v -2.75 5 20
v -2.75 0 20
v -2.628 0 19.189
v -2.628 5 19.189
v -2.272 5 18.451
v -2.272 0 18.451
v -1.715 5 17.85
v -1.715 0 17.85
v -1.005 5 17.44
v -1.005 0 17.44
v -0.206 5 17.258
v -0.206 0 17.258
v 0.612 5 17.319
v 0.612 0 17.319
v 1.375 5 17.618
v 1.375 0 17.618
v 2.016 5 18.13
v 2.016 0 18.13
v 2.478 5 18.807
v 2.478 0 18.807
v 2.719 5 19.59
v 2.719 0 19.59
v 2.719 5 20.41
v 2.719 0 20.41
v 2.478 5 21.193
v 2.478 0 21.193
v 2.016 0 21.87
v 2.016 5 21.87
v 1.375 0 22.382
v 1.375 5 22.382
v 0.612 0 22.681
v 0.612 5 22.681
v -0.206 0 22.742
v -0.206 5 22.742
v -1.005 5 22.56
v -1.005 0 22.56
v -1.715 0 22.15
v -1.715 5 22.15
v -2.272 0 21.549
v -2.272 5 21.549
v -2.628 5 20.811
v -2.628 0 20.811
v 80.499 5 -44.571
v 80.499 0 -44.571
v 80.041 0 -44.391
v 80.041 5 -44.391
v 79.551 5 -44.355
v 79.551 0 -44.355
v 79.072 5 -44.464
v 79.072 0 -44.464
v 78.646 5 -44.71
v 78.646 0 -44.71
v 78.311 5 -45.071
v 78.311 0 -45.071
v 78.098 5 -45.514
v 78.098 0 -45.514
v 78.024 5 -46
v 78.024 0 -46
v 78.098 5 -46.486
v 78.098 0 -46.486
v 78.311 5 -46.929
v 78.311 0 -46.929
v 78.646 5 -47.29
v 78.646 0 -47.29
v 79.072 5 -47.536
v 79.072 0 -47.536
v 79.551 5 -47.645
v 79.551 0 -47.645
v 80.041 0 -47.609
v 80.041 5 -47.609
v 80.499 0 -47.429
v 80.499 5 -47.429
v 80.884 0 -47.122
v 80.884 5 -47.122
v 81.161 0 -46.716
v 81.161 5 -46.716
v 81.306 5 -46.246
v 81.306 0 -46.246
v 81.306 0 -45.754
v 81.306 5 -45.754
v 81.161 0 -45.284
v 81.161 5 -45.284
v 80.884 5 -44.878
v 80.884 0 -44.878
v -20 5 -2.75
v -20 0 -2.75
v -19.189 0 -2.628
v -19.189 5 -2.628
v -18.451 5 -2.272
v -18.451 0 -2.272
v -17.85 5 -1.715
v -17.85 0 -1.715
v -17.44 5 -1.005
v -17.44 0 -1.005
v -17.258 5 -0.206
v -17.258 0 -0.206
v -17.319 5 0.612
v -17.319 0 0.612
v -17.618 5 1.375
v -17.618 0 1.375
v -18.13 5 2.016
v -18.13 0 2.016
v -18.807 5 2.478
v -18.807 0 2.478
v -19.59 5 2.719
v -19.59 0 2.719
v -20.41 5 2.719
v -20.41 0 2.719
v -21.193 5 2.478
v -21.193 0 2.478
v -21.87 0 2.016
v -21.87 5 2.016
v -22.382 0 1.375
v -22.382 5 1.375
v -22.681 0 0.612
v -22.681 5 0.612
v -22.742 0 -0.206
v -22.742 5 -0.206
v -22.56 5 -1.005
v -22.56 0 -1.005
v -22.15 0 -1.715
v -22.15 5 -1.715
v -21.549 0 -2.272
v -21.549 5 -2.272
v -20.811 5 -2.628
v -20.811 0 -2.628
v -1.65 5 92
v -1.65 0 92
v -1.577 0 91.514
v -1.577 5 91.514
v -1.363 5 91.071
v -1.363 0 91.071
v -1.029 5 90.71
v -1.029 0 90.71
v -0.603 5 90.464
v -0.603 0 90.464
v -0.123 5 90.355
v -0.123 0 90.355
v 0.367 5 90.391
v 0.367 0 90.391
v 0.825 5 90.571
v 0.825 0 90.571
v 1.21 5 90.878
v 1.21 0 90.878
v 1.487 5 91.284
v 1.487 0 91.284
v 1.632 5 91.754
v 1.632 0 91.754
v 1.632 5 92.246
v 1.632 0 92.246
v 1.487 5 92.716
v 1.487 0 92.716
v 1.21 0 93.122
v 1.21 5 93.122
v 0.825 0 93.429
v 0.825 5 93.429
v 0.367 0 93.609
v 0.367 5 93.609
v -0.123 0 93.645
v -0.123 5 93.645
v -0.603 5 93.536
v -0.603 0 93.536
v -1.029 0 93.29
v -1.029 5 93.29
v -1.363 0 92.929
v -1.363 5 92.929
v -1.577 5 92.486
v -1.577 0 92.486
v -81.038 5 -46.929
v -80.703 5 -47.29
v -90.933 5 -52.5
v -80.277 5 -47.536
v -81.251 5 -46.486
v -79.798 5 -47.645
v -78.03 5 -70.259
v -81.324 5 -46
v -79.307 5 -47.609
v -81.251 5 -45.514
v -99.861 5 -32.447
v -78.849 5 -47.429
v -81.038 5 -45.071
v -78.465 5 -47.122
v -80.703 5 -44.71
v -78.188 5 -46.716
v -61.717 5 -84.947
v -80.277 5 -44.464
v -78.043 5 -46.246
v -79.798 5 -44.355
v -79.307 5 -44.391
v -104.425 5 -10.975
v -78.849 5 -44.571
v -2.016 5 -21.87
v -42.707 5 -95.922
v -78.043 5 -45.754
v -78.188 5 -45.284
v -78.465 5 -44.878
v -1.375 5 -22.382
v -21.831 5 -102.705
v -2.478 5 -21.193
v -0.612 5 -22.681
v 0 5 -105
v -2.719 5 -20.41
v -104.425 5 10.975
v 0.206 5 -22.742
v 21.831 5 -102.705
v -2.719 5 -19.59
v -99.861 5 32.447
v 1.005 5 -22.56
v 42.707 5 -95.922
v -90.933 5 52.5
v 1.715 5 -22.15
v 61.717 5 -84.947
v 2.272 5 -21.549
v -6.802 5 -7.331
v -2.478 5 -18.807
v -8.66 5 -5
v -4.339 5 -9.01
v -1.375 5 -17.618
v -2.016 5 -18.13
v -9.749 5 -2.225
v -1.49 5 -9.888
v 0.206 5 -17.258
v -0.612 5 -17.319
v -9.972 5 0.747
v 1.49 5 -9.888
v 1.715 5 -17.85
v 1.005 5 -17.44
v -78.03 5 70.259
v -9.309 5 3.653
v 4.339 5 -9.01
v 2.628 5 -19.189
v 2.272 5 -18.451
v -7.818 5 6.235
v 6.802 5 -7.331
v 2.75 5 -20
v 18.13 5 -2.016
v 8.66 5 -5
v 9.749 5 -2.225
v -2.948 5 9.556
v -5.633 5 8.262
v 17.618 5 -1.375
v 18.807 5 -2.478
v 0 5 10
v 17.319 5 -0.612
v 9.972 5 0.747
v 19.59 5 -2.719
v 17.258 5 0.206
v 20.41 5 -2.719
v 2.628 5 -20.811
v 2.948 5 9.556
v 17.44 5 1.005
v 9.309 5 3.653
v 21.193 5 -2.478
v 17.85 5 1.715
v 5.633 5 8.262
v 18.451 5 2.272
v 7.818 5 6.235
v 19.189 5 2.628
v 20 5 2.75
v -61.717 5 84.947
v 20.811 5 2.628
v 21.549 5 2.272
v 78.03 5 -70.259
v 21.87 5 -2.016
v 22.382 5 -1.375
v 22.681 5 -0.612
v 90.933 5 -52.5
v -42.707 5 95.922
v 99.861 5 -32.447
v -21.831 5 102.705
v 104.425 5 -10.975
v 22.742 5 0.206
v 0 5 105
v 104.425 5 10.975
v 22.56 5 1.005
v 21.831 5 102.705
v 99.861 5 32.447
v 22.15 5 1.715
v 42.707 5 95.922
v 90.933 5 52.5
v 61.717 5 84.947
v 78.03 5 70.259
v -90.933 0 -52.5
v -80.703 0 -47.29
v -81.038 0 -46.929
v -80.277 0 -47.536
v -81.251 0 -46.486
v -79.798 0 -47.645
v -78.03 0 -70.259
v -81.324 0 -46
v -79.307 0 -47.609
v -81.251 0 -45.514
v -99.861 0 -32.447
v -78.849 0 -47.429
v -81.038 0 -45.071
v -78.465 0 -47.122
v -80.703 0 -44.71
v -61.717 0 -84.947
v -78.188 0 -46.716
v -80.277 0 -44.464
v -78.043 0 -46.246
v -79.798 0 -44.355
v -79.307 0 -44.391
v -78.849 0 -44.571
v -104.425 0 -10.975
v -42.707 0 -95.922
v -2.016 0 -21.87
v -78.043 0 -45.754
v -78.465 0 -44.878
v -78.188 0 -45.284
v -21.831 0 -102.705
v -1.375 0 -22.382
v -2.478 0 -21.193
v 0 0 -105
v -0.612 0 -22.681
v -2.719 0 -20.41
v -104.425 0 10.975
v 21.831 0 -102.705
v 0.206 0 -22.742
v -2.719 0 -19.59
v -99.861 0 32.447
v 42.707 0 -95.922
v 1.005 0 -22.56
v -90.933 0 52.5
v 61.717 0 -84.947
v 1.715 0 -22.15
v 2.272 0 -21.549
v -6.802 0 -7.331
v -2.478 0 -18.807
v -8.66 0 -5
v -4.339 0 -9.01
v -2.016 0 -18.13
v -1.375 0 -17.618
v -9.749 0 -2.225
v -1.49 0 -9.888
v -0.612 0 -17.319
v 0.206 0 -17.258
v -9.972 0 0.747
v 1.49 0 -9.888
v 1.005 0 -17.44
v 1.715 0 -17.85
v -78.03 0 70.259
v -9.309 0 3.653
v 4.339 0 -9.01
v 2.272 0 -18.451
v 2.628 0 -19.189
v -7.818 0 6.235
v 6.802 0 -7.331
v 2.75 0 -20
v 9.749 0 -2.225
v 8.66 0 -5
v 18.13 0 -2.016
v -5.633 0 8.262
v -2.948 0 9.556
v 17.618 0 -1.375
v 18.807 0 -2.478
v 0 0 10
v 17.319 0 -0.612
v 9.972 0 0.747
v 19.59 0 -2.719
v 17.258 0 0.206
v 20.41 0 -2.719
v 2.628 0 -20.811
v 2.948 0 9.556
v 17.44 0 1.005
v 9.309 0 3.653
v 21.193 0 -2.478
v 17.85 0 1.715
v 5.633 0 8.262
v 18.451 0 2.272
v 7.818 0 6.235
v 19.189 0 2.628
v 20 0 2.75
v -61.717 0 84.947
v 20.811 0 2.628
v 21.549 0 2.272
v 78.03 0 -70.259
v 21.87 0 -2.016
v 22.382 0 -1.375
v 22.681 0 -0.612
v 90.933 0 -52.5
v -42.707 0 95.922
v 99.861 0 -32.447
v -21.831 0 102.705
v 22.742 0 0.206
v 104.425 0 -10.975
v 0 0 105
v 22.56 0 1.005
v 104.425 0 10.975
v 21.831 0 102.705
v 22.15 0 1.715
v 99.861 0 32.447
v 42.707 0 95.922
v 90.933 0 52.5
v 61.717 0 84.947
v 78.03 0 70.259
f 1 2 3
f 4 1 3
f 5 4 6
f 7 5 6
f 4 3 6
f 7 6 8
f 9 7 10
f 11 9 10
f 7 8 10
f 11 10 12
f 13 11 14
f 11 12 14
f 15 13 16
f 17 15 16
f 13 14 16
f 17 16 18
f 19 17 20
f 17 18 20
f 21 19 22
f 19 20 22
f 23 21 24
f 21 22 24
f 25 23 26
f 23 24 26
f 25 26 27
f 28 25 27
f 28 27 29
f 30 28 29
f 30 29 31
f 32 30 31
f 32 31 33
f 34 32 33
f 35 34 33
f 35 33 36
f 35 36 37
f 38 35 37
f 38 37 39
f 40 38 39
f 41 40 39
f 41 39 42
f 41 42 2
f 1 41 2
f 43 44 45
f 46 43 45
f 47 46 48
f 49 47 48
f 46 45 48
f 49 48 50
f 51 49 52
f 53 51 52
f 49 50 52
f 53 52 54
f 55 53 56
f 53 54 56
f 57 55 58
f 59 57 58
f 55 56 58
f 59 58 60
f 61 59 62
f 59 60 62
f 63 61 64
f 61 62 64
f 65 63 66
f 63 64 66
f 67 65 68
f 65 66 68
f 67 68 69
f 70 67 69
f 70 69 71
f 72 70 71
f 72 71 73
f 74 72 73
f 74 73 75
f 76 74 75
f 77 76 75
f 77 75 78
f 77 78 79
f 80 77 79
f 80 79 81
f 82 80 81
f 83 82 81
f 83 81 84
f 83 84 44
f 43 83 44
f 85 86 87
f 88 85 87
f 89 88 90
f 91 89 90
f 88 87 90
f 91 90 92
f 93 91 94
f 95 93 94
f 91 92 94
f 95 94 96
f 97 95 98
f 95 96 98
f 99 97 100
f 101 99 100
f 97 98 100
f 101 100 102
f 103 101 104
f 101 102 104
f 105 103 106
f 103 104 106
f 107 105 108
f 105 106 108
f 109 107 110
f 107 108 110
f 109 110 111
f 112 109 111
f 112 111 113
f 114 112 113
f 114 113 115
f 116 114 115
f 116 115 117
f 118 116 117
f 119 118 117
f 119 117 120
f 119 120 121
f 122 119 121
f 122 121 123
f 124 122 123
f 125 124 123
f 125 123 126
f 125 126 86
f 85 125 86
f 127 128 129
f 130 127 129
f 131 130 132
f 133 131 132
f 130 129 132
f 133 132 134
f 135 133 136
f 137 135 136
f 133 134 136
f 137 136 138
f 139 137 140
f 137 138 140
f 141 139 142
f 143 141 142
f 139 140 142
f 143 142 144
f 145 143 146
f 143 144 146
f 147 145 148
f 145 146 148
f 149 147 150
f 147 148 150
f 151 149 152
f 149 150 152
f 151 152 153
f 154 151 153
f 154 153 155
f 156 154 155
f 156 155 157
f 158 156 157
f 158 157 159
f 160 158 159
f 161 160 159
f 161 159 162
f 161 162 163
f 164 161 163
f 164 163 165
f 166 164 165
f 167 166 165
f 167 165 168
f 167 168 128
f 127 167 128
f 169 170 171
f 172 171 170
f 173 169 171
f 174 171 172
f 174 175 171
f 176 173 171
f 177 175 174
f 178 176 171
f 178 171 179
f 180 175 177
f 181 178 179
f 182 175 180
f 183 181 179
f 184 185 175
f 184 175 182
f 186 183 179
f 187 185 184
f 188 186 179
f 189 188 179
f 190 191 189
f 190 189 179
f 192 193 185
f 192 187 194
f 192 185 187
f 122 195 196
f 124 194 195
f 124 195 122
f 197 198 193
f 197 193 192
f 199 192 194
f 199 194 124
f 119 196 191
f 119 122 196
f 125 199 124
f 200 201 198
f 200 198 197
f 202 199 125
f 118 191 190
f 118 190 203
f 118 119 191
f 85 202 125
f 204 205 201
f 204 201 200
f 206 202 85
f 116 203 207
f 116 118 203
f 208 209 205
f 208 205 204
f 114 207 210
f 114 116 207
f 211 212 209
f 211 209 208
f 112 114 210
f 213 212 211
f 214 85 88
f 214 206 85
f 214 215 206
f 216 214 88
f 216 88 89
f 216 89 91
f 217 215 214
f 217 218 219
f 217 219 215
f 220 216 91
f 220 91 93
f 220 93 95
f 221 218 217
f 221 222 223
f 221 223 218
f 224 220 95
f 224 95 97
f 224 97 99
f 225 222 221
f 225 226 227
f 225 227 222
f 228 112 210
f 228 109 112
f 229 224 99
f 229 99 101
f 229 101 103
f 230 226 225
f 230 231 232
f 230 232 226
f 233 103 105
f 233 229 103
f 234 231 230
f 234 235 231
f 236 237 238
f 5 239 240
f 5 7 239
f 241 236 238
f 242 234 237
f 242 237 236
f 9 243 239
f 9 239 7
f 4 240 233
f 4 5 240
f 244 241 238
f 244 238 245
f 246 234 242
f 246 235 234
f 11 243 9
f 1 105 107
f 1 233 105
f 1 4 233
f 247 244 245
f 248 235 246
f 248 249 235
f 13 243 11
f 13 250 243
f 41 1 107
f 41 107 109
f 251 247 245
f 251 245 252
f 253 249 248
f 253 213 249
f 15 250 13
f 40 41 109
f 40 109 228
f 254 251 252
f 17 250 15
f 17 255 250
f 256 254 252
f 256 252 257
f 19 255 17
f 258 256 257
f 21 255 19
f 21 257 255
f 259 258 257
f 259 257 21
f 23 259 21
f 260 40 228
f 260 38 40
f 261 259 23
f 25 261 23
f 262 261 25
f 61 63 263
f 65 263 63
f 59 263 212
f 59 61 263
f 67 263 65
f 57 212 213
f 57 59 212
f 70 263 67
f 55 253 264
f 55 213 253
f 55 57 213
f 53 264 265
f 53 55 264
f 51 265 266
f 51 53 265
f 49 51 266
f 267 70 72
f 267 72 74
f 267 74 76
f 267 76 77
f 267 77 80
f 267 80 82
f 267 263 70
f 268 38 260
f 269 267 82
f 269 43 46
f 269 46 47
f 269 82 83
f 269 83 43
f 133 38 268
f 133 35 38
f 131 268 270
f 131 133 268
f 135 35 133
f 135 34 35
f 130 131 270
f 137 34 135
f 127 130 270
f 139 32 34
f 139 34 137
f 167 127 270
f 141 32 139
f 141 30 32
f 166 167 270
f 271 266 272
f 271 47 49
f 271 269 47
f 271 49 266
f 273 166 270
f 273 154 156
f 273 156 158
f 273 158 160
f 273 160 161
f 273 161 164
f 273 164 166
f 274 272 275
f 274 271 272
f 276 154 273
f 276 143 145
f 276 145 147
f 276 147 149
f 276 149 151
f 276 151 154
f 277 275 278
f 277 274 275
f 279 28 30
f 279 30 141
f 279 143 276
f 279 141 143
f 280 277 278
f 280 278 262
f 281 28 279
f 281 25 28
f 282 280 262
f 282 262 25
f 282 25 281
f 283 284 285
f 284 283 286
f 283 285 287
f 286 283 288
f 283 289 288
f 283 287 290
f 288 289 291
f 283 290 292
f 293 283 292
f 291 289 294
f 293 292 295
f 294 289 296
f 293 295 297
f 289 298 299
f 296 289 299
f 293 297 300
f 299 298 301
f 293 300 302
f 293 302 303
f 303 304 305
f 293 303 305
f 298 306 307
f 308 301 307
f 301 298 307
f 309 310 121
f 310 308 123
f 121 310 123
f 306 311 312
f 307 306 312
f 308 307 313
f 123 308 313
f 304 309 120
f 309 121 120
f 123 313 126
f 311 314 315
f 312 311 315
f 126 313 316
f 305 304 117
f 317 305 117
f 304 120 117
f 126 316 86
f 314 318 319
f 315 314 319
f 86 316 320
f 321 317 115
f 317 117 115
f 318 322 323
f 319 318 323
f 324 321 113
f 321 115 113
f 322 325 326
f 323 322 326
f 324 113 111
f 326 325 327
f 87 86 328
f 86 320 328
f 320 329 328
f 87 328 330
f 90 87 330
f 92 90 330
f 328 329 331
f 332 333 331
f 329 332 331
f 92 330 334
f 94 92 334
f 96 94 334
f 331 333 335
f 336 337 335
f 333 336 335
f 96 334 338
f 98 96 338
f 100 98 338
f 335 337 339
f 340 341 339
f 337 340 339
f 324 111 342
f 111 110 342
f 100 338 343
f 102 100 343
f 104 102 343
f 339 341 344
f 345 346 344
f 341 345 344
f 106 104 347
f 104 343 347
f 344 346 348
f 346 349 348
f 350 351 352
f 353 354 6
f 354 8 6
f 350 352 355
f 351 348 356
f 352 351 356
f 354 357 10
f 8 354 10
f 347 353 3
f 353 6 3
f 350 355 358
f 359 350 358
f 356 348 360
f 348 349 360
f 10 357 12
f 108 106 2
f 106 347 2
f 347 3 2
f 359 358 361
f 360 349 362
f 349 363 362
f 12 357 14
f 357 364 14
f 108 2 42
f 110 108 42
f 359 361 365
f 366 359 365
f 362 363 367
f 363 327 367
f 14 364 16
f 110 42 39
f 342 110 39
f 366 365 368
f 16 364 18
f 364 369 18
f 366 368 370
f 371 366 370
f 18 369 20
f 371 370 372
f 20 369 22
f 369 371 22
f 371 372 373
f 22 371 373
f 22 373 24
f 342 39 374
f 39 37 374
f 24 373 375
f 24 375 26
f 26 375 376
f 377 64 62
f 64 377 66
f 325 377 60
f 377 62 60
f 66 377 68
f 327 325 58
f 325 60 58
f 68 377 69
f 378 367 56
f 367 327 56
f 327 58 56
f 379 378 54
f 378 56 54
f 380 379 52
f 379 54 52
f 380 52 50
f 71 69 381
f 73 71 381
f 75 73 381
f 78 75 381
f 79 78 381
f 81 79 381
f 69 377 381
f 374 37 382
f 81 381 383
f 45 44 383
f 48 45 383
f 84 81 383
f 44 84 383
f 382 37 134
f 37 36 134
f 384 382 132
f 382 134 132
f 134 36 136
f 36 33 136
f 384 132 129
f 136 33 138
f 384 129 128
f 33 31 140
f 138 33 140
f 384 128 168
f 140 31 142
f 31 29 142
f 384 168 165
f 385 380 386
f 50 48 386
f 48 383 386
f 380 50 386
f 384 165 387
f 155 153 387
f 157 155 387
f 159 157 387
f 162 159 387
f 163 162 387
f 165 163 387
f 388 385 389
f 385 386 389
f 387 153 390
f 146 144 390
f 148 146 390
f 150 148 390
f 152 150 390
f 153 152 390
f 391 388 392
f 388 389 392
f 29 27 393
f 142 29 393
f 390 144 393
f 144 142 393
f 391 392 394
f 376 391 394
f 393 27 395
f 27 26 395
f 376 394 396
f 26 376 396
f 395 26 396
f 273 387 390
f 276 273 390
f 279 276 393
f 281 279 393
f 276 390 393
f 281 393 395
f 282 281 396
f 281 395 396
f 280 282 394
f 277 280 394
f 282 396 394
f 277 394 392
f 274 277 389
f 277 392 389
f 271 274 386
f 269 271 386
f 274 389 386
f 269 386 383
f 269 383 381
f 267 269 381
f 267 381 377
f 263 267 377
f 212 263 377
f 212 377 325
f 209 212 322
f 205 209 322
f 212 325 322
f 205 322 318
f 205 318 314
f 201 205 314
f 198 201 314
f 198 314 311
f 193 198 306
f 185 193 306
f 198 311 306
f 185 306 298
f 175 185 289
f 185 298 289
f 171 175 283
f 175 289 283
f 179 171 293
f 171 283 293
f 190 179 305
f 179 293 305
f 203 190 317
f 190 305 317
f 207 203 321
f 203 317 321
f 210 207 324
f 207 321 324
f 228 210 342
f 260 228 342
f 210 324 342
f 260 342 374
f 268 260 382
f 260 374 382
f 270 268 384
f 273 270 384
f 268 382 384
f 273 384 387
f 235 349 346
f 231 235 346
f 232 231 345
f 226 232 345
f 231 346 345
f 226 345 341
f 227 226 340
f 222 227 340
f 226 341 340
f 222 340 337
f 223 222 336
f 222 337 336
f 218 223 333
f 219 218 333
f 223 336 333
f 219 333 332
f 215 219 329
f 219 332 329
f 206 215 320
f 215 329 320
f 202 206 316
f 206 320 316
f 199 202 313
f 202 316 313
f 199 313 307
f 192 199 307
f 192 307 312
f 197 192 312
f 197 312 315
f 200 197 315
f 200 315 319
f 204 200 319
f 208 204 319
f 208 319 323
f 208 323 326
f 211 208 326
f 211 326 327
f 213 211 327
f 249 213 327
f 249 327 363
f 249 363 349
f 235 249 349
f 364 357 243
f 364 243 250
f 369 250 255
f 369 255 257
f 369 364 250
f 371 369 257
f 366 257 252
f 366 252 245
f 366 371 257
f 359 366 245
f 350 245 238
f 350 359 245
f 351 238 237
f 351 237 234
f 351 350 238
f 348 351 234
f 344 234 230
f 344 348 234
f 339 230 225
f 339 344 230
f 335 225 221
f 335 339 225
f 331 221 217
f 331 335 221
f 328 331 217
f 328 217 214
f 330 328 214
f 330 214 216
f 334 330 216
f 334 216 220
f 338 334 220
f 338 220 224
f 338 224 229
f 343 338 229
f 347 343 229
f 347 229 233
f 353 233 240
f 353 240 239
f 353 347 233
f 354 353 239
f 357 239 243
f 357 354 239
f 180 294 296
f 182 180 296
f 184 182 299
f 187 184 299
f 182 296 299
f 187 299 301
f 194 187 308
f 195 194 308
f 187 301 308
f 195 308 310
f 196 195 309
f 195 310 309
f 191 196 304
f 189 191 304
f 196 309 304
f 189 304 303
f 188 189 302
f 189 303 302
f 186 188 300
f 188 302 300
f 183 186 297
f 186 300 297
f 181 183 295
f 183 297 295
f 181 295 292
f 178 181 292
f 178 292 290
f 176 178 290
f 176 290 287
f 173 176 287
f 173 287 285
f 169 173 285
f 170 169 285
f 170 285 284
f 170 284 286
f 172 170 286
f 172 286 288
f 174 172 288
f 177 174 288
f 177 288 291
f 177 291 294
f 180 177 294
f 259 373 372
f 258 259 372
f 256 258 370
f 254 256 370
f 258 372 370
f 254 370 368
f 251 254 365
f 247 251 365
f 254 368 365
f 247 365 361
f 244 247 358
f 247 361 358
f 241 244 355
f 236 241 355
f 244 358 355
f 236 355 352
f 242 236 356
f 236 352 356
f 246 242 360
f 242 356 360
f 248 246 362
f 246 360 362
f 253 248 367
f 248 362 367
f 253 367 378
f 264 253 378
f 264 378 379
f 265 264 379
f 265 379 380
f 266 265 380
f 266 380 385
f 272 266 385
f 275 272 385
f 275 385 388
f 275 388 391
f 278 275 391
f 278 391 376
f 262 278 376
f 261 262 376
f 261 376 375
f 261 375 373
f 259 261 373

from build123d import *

# Parameters (mm, degrees)
ESQUISSE1_R                               = 105
ESQUISSE1_R_2                             = 10
BOSS_EXTRU_1_DEPTH                        = 5
TROU_POUR_TARAUDAGE_POUR_TROU_TARAUD_M4_D = 3.3
R_P_TITION_CIRCULAIRE1_COUNT              = 3
D_GAGEMENT_M51_D                          = 5.5
R_P_TITION_CIRCULAIRE2_COUNT              = 4


with BuildPart() as part:
    # Esquisse1 → Boss.-Extru.1 (new body)
    with BuildSketch(Plane(origin=(0, 0, 0), x_dir=(1, 0, 0), z_dir=(0, 1, 0))):
        Circle(ESQUISSE1_R)
        Circle(ESQUISSE1_R_2, mode=Mode.SUBTRACT)
    extrude(amount=BOSS_EXTRU_1_DEPTH)

    # Trou pour taraudage pour trou taraudé M41 (through all)
    with Locations(Plane(origin=(0, 5, 0), x_dir=(1, 0, 0), z_dir=(0, 1, 0))):
        with Locations((0, -92)):
            trou_pour_taraudage_pour_trou_taraud_m4 = Hole(TROU_POUR_TARAUDAGE_POUR_TROU_TARAUD_M4_D / 2)

    # Répétition circulaire1: Trou pour taraudage pour trou taraudé M41 ×3 about axis
    r_p_tition_circulaire1_axis = Axis((0, 5, 0), (0, -1, 0))
    for i in range(1, R_P_TITION_CIRCULAIRE1_COUNT):
        add(trou_pour_taraudage_pour_trou_taraud_m4.rotate(r_p_tition_circulaire1_axis, i * 360 / R_P_TITION_CIRCULAIRE1_COUNT), mode=Mode.SUBTRACT)

    # Dégagement M51 (through all)
    with Locations(Plane(origin=(0, 5, 0), x_dir=(1, 0, 0), z_dir=(0, 1, 0))):
        with Locations((0, -20)):
            d_gagement_m51 = Hole(D_GAGEMENT_M51_D / 2)

    # Répétition circulaire2: Dégagement M51 ×4 about axis
    r_p_tition_circulaire2_axis = Axis((0, 5, 0), (0, -1, 0))
    for i in range(1, R_P_TITION_CIRCULAIRE2_COUNT):
        add(d_gagement_m51.rotate(r_p_tition_circulaire2_axis, i * 360 / R_P_TITION_CIRCULAIRE2_COUNT), mode=Mode.SUBTRACT)


solid = part.part
